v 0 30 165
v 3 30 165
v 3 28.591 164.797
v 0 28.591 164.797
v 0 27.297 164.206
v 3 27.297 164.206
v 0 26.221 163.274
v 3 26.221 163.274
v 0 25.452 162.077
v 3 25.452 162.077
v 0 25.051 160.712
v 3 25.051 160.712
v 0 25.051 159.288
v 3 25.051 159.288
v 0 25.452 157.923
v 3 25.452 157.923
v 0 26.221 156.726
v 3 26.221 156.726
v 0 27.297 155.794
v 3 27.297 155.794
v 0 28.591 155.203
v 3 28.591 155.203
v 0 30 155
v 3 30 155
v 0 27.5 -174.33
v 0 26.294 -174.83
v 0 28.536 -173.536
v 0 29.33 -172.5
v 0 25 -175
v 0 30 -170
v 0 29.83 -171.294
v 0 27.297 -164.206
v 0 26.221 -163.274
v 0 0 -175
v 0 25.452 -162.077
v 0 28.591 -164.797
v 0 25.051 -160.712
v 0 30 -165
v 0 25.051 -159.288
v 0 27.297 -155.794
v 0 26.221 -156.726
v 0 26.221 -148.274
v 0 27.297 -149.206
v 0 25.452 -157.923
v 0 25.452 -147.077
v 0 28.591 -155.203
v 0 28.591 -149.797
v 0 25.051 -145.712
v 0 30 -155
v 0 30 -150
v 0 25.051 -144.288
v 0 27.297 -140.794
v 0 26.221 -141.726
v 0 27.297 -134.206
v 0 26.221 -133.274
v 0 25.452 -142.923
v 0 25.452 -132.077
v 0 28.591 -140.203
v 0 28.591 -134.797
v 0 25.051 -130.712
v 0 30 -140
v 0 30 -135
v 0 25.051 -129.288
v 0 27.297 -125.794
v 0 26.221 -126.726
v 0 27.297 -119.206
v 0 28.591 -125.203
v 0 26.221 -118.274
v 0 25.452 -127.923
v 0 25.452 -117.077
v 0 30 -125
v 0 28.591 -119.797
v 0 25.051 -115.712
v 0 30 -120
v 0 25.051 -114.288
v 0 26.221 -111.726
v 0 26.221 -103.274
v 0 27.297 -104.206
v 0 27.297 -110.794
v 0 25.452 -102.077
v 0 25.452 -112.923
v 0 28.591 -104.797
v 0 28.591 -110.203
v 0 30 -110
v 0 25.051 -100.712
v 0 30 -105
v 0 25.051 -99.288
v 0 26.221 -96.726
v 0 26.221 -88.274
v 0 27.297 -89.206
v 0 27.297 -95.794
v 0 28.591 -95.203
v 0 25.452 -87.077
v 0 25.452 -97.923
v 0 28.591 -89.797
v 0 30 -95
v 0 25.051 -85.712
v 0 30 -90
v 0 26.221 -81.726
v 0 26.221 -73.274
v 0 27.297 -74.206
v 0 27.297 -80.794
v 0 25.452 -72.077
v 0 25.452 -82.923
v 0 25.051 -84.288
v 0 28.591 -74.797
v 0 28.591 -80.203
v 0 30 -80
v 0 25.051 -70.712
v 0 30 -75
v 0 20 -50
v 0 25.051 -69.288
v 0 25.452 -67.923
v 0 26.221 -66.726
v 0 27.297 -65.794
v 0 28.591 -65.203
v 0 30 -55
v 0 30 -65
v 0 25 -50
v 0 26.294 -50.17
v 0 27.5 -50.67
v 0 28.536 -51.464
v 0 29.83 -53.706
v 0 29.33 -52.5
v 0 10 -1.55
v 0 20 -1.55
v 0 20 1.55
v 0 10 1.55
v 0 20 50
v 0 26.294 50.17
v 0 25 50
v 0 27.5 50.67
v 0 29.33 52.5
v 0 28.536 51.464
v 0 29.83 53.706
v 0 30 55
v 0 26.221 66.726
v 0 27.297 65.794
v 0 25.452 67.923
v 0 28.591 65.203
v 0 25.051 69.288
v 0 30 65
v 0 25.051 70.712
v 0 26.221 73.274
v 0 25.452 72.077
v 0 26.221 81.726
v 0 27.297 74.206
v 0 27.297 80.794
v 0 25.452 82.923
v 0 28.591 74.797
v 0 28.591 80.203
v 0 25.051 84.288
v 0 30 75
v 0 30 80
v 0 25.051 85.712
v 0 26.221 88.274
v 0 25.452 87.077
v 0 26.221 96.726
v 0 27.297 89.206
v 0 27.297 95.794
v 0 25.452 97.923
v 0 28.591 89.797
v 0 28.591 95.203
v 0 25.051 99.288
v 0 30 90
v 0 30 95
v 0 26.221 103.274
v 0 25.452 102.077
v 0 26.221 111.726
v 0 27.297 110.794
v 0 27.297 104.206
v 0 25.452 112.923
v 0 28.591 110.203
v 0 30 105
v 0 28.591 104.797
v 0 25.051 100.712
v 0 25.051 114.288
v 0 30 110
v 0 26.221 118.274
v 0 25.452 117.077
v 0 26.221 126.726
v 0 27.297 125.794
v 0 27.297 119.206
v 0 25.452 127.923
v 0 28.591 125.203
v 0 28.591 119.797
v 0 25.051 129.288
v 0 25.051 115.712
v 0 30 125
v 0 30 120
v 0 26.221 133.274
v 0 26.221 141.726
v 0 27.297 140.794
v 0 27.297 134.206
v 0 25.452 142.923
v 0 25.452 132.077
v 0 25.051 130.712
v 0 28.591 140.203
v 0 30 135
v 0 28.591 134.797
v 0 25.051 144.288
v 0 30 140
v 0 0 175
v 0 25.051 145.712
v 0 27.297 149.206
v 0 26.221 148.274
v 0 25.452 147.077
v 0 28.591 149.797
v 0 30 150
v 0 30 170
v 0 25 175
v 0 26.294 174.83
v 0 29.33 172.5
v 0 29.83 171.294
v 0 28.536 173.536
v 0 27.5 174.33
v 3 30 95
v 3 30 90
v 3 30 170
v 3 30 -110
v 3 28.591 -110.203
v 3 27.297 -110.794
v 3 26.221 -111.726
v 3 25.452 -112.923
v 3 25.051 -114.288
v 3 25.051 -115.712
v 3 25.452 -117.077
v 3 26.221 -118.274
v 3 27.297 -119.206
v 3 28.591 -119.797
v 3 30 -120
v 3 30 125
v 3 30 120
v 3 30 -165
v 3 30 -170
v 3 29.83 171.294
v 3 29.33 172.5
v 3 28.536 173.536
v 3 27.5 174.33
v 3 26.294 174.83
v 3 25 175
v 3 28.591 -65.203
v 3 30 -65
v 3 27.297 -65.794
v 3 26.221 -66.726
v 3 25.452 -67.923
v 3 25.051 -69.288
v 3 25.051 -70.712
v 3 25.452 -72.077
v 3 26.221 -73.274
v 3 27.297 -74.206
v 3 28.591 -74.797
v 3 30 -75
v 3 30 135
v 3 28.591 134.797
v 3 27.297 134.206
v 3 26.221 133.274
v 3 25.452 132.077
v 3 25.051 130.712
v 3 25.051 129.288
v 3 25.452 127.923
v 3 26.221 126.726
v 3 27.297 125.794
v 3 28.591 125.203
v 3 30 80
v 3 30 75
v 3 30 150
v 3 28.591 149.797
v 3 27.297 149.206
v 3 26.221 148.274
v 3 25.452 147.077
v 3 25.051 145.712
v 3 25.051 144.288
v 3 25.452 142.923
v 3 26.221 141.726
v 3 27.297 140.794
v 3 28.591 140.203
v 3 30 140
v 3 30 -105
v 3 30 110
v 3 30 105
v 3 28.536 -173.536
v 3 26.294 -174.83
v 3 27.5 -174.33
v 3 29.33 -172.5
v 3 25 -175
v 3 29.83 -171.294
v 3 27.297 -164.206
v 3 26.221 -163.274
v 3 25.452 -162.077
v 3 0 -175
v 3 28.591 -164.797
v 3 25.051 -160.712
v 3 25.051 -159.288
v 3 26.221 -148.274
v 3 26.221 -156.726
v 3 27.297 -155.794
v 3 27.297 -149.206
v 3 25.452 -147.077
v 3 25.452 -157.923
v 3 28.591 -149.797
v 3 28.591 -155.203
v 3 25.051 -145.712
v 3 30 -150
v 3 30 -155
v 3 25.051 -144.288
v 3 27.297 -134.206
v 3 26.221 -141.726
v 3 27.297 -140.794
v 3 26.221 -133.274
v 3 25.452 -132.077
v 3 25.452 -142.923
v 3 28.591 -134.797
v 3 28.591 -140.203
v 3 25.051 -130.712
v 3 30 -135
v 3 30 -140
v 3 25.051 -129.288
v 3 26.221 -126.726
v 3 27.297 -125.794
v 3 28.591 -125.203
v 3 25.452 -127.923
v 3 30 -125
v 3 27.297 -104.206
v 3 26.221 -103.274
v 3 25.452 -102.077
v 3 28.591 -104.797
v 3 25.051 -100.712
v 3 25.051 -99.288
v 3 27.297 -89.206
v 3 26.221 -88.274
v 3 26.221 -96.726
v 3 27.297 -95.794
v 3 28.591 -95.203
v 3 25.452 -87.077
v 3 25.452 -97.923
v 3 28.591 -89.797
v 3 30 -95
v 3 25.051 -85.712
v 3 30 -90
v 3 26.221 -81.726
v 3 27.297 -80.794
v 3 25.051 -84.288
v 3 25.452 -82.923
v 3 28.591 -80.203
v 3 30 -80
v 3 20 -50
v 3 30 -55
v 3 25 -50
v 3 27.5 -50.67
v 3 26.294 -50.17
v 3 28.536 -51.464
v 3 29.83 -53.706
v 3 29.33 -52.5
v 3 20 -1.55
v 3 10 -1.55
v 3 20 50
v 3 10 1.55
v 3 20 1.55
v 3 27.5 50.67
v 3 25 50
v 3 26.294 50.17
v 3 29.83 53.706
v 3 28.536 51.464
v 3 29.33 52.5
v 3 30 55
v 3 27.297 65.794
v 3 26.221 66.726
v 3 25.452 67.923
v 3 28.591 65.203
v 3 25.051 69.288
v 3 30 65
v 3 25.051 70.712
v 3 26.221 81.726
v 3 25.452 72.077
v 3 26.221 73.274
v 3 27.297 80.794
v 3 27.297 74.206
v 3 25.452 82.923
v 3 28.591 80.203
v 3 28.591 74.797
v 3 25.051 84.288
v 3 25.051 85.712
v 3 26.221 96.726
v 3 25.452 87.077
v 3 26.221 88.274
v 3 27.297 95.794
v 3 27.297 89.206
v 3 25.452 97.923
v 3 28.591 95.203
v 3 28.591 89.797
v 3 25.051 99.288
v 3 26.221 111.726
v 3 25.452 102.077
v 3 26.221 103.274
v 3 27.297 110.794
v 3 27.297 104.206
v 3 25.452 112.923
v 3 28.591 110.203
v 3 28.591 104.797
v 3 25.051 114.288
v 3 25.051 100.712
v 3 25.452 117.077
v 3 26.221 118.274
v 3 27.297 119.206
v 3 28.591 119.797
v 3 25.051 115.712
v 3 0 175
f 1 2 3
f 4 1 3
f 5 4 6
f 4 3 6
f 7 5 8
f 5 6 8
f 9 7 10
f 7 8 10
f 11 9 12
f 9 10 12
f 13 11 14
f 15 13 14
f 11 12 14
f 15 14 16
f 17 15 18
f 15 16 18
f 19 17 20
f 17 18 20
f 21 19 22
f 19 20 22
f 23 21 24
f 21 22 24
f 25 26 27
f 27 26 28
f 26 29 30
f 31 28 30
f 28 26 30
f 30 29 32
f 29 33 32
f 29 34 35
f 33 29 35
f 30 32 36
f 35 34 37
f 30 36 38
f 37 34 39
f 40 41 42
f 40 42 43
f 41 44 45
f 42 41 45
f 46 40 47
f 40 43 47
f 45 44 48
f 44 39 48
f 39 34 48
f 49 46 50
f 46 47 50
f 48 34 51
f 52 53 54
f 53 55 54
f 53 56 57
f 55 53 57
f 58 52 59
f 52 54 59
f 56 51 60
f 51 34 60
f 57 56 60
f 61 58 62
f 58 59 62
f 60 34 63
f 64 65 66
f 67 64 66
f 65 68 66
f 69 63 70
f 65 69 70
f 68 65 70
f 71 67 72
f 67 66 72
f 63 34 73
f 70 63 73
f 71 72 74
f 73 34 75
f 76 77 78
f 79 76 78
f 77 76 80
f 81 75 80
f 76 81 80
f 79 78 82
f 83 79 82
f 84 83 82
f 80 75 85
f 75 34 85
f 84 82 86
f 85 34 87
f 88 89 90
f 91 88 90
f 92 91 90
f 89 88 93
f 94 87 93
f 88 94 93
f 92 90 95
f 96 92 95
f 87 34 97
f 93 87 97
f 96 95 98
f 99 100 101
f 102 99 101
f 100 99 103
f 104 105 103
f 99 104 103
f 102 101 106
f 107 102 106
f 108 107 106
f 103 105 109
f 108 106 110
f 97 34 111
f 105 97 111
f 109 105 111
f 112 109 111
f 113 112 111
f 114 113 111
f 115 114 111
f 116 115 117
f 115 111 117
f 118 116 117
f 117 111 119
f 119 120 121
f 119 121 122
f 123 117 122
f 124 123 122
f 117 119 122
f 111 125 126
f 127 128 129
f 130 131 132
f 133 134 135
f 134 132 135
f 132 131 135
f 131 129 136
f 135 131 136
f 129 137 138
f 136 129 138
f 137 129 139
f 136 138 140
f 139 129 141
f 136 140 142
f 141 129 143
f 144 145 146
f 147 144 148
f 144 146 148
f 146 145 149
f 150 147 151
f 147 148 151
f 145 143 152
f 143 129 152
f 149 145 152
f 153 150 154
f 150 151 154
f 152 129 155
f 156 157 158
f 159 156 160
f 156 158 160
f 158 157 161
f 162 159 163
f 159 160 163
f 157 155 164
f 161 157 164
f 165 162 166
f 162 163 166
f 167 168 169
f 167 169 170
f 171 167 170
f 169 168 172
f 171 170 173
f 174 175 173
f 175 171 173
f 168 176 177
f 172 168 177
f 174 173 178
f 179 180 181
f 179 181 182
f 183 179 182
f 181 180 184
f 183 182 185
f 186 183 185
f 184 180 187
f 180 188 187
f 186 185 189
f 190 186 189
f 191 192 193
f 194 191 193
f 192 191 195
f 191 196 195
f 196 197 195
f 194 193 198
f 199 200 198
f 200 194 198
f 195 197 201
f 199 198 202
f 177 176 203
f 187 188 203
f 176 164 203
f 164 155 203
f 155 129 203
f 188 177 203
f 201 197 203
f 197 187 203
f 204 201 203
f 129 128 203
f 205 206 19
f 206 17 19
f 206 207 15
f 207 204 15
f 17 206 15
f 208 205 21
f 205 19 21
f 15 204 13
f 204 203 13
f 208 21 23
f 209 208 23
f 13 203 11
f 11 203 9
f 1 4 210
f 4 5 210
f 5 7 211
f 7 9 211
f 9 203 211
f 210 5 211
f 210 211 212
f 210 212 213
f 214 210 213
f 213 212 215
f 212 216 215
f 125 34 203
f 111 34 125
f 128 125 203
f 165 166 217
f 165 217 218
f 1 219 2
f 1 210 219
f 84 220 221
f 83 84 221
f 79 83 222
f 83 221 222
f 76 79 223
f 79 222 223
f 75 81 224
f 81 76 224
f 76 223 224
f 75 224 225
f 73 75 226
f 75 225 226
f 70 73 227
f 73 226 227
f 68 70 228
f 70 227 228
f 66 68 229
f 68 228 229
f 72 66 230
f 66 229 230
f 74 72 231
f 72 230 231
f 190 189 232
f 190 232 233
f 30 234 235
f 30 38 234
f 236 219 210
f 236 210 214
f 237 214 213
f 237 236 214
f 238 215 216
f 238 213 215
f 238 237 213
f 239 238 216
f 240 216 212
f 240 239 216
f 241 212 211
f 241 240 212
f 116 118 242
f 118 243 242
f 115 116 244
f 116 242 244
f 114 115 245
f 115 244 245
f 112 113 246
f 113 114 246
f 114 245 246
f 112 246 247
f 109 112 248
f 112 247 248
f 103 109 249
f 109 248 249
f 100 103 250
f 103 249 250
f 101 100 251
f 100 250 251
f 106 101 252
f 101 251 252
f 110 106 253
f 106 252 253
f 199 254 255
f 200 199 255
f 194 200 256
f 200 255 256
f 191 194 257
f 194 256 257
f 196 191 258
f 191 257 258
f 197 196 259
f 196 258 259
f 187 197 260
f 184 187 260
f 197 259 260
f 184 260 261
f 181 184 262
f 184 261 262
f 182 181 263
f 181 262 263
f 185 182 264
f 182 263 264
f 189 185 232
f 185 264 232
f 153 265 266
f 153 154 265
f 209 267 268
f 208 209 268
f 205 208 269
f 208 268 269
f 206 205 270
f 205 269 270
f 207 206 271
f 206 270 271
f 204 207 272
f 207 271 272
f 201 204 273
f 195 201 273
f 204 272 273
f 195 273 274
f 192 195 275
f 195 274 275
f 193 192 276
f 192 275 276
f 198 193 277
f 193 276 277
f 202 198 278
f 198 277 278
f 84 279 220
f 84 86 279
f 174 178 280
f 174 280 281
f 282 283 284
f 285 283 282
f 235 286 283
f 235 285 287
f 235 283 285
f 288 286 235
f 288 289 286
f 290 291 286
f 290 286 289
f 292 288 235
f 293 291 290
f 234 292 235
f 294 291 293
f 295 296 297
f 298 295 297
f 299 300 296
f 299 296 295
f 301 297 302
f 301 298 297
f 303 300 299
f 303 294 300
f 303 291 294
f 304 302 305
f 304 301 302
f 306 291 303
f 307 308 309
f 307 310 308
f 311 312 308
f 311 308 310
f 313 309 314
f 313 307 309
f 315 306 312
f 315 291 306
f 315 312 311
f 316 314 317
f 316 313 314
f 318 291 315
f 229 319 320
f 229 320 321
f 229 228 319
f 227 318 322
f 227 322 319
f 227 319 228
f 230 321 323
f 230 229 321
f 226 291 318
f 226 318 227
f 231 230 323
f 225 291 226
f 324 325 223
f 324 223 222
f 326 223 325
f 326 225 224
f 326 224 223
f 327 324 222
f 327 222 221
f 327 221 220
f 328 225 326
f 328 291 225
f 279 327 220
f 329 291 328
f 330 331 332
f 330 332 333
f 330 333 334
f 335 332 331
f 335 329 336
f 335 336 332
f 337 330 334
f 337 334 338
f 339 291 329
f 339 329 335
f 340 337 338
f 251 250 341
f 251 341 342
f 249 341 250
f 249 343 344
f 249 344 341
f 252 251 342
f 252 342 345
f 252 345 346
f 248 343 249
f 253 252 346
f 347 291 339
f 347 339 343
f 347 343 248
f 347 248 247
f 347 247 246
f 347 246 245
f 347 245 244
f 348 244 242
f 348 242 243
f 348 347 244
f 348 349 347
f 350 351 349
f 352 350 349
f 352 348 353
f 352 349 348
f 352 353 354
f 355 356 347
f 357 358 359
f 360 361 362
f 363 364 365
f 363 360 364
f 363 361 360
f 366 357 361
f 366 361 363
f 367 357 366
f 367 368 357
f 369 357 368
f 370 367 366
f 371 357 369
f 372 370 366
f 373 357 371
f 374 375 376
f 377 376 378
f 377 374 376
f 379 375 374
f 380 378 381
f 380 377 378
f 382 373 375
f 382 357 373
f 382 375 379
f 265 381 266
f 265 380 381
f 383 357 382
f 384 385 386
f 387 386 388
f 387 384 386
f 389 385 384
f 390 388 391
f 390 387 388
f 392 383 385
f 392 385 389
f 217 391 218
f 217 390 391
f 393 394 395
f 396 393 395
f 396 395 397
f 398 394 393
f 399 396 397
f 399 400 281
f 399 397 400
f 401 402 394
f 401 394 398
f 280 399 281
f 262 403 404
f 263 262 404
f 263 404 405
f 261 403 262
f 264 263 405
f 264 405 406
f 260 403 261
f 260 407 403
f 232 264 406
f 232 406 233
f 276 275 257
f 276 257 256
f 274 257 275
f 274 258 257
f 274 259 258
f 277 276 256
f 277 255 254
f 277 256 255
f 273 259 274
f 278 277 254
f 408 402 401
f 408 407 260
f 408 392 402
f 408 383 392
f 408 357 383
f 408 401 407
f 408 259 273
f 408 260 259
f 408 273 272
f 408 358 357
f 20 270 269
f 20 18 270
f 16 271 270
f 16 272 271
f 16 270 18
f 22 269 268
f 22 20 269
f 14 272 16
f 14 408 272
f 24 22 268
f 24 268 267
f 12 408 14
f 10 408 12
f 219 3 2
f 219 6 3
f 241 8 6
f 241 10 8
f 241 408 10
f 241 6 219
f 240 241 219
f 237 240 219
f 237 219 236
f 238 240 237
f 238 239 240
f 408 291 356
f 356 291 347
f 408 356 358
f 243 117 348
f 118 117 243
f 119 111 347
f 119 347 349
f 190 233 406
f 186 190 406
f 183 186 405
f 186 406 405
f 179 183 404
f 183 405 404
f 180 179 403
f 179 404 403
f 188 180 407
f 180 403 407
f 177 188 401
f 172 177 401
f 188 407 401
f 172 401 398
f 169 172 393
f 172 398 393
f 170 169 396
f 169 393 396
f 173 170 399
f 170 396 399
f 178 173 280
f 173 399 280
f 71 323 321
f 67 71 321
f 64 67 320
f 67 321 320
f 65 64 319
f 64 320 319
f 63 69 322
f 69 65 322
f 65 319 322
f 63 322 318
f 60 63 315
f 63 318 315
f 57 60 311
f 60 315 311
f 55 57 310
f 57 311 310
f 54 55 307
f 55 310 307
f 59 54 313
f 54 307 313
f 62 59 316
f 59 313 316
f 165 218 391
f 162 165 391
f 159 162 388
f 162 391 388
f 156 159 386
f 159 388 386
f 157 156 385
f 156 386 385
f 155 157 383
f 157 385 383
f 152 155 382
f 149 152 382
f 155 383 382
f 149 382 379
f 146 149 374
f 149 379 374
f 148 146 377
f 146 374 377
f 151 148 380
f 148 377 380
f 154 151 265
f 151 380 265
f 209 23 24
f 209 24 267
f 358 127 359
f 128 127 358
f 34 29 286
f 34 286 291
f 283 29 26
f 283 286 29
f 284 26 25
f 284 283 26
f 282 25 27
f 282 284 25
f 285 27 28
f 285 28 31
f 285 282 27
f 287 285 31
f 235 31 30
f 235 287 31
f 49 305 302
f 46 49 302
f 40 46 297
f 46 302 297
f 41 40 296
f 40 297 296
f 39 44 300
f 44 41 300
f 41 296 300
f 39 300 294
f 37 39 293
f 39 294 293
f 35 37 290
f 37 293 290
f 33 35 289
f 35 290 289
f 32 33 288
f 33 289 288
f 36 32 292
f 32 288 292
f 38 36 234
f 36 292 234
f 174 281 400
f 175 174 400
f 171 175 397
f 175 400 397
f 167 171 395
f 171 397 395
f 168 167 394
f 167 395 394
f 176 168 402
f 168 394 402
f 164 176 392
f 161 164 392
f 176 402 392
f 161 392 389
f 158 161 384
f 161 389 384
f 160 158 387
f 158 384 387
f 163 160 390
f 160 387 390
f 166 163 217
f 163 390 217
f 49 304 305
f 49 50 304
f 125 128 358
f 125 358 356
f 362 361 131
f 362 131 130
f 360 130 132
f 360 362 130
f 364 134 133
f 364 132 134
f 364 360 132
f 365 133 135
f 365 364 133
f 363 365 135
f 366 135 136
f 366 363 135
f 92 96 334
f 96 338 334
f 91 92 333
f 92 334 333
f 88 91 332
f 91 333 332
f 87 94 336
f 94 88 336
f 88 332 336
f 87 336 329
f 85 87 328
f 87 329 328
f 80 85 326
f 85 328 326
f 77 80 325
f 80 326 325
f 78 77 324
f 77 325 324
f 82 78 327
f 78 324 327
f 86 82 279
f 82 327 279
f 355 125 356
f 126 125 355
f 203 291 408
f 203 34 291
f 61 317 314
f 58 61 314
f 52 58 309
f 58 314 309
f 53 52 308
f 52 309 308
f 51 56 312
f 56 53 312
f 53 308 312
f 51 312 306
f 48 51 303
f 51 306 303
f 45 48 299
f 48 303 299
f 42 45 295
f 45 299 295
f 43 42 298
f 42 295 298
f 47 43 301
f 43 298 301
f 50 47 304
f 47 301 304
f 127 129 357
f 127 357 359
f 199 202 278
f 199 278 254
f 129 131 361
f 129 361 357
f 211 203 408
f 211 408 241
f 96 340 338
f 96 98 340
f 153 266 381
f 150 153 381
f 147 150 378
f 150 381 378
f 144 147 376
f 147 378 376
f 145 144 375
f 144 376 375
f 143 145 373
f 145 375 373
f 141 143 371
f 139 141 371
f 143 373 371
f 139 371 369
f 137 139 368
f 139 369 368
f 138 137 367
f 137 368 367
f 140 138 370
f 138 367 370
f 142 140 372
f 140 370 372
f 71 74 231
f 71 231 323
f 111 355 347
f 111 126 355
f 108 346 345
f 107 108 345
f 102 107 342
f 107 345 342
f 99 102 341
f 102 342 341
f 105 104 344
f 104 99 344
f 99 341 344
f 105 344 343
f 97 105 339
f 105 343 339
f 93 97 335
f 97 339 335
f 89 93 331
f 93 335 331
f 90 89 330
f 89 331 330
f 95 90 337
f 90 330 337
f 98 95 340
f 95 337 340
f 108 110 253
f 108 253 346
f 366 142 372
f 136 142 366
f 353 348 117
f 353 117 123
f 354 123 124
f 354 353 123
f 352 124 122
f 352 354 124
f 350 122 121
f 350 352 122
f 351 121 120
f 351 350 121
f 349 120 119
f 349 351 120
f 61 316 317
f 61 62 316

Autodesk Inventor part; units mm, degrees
ref_plane "YZ Plane" through (0, 0, 0) normal (1, 0, 0) x (0, 1, 0)
ref_plane "XZ Plane" through (0, 0, 0) normal (0, 1, 0) x (-1, 0, 0)
ref_plane "XY Plane" through (0, 0, 0) normal (0, 0, 1) x (1, 0, 0)
sketch "Sketch1" plane through (0, 0, 0) normal (1, 0, 0) x (0, 1, 0)
  line L0 (0, 175) -> (30, 175)
  line L1 (30, 175) -> (30, -175)
  line L2 (30, -175) -> (0, -175)
  line L3 (0, -175) -> (0, 175)
  line L4 (40, 50) -> (20, 50)
  line L5 (20, 50) -> (20, -50)
  line L6 (20, -50) -> (40, -50)
  line L7 (40, -3.1) -> (40, 50)
  line L8 (40, 50) -> (20, -50) construction
  line L9 (20, 50) -> (40, -50) construction
  line L10 (30, 1.55) -> (10, 1.55)
  line L11 (10, 1.55) -> (10, -1.55)
  line L12 (30, -1.55) -> (30, 1.55)
  line L13 (30, 1.55) -> (10, -1.55) construction
  line L14 (10, 1.55) -> (30, -1.55) construction
  line L15 (10, -1.55) -> (20, -1.55)
  line L16 (29.69, -1.55) -> (30, -1.55)
  point P0 (0, 0)
  point P1 (0, 0)
  point P2 (30, 0)
  point P3 (20, 0)
  point P4 (30, -50)
  point P5 (20, 1.55)
  point P6 (30, 50)
  dimension "d0" = 30
  dimension "d1" = 350
  dimension "d2" = 0
  dimension "d3" = 100
  dimension "d4" = 20
  dimension "d5" = 20
  dimension "d6" = 3.1
extrude "Extrusion1" add sketch "Sketch1" along normal blind 3 contours L0 L1 L4 L5 L10 L11 L15 L6 L2 L3
sketch "Sketch2" plane through (3, 0, 0) normal (1, 0, 0) x (0, 0, -1)
  line L0 (-50, 30) -> (-175, 30) projected
  circle A0 centre (-160, 30) radius 5
  circle A1 centre (-145, 30) radius 5
  circle A2 centre (-130, 30) radius 5
  circle A3 centre (-115, 30) radius 5
  circle A4 centre (-100, 30) radius 5
  circle A5 centre (-85, 30) radius 5
  circle A6 centre (-70, 30) radius 5
  line L1 (-175, 30) -> (-175, 0) projected
  line L2 (-50, 30) -> (-175, 30) projected
  point P0 (0, 0)
  point P1 (-75, 30)
  point P2 (-65, 30)
  point P3 (-90, 30)
  point P4 (-80, 30)
  point P5 (-105, 30)
  point P6 (-95, 30)
  point P7 (-120, 30)
  point P8 (-110, 30)
  point P9 (-135, 30)
  point P10 (-125, 30)
  point P11 (-150, 30)
  point P12 (-140, 30)
  point P13 (-165, 30)
  point P14 (-155, 30)
  dimension "d9" = 10
  dimension "d10" = 10
  dimension "d11" = 10
  dimension "d12" = 10
  dimension "d13" = 10
  dimension "d14" = 10
  dimension "d15" = 10
  dimension "d16" = 15
  dimension "d17" = 15
  dimension "d18" = 15
  dimension "d19" = 15
  dimension "d20" = 15
  dimension "d21" = 15
  dimension "d22" = 15
extrude "Extrusion2" cut sketch "Sketch2" against normal blind 3 contours A6 L0 | A0 L0 | A1 L0 | A2 L0 | A3 L0 | A4 L0 | A5 L0 picked at (-68.8623, 27.8538) picked at (-161.4384, 28.1203) picked at (-146.4384, 28.1203) picked at (-131.2475, 28.8948) picked at (-113.8623, 27.8538) picked at (-98.8623, 27.8538) picked at (-83.8623, 27.8538)
fillet "Fillet1" radius 5 2 edges at (1.5, 30, 175) (1.5, 30, 50)
mirror "Mirror1" about plane through (0, 0, 0) normal (0, 0, 1) of "Fillet1", "Extrusion2"
equation "\"d10\" = d9"
equation "\"d11\" = d10"
equation "\"d12\" = d9"
equation "\"d13\" = d9"
equation "\"d14\" = d9"
equation "\"d15\" = d9"
equation "\"d20\" = d19"
equation "\"d21\" = d20"
equation "\"d22\" = d21"
properties part number "StoveTop2" material "Steel"
